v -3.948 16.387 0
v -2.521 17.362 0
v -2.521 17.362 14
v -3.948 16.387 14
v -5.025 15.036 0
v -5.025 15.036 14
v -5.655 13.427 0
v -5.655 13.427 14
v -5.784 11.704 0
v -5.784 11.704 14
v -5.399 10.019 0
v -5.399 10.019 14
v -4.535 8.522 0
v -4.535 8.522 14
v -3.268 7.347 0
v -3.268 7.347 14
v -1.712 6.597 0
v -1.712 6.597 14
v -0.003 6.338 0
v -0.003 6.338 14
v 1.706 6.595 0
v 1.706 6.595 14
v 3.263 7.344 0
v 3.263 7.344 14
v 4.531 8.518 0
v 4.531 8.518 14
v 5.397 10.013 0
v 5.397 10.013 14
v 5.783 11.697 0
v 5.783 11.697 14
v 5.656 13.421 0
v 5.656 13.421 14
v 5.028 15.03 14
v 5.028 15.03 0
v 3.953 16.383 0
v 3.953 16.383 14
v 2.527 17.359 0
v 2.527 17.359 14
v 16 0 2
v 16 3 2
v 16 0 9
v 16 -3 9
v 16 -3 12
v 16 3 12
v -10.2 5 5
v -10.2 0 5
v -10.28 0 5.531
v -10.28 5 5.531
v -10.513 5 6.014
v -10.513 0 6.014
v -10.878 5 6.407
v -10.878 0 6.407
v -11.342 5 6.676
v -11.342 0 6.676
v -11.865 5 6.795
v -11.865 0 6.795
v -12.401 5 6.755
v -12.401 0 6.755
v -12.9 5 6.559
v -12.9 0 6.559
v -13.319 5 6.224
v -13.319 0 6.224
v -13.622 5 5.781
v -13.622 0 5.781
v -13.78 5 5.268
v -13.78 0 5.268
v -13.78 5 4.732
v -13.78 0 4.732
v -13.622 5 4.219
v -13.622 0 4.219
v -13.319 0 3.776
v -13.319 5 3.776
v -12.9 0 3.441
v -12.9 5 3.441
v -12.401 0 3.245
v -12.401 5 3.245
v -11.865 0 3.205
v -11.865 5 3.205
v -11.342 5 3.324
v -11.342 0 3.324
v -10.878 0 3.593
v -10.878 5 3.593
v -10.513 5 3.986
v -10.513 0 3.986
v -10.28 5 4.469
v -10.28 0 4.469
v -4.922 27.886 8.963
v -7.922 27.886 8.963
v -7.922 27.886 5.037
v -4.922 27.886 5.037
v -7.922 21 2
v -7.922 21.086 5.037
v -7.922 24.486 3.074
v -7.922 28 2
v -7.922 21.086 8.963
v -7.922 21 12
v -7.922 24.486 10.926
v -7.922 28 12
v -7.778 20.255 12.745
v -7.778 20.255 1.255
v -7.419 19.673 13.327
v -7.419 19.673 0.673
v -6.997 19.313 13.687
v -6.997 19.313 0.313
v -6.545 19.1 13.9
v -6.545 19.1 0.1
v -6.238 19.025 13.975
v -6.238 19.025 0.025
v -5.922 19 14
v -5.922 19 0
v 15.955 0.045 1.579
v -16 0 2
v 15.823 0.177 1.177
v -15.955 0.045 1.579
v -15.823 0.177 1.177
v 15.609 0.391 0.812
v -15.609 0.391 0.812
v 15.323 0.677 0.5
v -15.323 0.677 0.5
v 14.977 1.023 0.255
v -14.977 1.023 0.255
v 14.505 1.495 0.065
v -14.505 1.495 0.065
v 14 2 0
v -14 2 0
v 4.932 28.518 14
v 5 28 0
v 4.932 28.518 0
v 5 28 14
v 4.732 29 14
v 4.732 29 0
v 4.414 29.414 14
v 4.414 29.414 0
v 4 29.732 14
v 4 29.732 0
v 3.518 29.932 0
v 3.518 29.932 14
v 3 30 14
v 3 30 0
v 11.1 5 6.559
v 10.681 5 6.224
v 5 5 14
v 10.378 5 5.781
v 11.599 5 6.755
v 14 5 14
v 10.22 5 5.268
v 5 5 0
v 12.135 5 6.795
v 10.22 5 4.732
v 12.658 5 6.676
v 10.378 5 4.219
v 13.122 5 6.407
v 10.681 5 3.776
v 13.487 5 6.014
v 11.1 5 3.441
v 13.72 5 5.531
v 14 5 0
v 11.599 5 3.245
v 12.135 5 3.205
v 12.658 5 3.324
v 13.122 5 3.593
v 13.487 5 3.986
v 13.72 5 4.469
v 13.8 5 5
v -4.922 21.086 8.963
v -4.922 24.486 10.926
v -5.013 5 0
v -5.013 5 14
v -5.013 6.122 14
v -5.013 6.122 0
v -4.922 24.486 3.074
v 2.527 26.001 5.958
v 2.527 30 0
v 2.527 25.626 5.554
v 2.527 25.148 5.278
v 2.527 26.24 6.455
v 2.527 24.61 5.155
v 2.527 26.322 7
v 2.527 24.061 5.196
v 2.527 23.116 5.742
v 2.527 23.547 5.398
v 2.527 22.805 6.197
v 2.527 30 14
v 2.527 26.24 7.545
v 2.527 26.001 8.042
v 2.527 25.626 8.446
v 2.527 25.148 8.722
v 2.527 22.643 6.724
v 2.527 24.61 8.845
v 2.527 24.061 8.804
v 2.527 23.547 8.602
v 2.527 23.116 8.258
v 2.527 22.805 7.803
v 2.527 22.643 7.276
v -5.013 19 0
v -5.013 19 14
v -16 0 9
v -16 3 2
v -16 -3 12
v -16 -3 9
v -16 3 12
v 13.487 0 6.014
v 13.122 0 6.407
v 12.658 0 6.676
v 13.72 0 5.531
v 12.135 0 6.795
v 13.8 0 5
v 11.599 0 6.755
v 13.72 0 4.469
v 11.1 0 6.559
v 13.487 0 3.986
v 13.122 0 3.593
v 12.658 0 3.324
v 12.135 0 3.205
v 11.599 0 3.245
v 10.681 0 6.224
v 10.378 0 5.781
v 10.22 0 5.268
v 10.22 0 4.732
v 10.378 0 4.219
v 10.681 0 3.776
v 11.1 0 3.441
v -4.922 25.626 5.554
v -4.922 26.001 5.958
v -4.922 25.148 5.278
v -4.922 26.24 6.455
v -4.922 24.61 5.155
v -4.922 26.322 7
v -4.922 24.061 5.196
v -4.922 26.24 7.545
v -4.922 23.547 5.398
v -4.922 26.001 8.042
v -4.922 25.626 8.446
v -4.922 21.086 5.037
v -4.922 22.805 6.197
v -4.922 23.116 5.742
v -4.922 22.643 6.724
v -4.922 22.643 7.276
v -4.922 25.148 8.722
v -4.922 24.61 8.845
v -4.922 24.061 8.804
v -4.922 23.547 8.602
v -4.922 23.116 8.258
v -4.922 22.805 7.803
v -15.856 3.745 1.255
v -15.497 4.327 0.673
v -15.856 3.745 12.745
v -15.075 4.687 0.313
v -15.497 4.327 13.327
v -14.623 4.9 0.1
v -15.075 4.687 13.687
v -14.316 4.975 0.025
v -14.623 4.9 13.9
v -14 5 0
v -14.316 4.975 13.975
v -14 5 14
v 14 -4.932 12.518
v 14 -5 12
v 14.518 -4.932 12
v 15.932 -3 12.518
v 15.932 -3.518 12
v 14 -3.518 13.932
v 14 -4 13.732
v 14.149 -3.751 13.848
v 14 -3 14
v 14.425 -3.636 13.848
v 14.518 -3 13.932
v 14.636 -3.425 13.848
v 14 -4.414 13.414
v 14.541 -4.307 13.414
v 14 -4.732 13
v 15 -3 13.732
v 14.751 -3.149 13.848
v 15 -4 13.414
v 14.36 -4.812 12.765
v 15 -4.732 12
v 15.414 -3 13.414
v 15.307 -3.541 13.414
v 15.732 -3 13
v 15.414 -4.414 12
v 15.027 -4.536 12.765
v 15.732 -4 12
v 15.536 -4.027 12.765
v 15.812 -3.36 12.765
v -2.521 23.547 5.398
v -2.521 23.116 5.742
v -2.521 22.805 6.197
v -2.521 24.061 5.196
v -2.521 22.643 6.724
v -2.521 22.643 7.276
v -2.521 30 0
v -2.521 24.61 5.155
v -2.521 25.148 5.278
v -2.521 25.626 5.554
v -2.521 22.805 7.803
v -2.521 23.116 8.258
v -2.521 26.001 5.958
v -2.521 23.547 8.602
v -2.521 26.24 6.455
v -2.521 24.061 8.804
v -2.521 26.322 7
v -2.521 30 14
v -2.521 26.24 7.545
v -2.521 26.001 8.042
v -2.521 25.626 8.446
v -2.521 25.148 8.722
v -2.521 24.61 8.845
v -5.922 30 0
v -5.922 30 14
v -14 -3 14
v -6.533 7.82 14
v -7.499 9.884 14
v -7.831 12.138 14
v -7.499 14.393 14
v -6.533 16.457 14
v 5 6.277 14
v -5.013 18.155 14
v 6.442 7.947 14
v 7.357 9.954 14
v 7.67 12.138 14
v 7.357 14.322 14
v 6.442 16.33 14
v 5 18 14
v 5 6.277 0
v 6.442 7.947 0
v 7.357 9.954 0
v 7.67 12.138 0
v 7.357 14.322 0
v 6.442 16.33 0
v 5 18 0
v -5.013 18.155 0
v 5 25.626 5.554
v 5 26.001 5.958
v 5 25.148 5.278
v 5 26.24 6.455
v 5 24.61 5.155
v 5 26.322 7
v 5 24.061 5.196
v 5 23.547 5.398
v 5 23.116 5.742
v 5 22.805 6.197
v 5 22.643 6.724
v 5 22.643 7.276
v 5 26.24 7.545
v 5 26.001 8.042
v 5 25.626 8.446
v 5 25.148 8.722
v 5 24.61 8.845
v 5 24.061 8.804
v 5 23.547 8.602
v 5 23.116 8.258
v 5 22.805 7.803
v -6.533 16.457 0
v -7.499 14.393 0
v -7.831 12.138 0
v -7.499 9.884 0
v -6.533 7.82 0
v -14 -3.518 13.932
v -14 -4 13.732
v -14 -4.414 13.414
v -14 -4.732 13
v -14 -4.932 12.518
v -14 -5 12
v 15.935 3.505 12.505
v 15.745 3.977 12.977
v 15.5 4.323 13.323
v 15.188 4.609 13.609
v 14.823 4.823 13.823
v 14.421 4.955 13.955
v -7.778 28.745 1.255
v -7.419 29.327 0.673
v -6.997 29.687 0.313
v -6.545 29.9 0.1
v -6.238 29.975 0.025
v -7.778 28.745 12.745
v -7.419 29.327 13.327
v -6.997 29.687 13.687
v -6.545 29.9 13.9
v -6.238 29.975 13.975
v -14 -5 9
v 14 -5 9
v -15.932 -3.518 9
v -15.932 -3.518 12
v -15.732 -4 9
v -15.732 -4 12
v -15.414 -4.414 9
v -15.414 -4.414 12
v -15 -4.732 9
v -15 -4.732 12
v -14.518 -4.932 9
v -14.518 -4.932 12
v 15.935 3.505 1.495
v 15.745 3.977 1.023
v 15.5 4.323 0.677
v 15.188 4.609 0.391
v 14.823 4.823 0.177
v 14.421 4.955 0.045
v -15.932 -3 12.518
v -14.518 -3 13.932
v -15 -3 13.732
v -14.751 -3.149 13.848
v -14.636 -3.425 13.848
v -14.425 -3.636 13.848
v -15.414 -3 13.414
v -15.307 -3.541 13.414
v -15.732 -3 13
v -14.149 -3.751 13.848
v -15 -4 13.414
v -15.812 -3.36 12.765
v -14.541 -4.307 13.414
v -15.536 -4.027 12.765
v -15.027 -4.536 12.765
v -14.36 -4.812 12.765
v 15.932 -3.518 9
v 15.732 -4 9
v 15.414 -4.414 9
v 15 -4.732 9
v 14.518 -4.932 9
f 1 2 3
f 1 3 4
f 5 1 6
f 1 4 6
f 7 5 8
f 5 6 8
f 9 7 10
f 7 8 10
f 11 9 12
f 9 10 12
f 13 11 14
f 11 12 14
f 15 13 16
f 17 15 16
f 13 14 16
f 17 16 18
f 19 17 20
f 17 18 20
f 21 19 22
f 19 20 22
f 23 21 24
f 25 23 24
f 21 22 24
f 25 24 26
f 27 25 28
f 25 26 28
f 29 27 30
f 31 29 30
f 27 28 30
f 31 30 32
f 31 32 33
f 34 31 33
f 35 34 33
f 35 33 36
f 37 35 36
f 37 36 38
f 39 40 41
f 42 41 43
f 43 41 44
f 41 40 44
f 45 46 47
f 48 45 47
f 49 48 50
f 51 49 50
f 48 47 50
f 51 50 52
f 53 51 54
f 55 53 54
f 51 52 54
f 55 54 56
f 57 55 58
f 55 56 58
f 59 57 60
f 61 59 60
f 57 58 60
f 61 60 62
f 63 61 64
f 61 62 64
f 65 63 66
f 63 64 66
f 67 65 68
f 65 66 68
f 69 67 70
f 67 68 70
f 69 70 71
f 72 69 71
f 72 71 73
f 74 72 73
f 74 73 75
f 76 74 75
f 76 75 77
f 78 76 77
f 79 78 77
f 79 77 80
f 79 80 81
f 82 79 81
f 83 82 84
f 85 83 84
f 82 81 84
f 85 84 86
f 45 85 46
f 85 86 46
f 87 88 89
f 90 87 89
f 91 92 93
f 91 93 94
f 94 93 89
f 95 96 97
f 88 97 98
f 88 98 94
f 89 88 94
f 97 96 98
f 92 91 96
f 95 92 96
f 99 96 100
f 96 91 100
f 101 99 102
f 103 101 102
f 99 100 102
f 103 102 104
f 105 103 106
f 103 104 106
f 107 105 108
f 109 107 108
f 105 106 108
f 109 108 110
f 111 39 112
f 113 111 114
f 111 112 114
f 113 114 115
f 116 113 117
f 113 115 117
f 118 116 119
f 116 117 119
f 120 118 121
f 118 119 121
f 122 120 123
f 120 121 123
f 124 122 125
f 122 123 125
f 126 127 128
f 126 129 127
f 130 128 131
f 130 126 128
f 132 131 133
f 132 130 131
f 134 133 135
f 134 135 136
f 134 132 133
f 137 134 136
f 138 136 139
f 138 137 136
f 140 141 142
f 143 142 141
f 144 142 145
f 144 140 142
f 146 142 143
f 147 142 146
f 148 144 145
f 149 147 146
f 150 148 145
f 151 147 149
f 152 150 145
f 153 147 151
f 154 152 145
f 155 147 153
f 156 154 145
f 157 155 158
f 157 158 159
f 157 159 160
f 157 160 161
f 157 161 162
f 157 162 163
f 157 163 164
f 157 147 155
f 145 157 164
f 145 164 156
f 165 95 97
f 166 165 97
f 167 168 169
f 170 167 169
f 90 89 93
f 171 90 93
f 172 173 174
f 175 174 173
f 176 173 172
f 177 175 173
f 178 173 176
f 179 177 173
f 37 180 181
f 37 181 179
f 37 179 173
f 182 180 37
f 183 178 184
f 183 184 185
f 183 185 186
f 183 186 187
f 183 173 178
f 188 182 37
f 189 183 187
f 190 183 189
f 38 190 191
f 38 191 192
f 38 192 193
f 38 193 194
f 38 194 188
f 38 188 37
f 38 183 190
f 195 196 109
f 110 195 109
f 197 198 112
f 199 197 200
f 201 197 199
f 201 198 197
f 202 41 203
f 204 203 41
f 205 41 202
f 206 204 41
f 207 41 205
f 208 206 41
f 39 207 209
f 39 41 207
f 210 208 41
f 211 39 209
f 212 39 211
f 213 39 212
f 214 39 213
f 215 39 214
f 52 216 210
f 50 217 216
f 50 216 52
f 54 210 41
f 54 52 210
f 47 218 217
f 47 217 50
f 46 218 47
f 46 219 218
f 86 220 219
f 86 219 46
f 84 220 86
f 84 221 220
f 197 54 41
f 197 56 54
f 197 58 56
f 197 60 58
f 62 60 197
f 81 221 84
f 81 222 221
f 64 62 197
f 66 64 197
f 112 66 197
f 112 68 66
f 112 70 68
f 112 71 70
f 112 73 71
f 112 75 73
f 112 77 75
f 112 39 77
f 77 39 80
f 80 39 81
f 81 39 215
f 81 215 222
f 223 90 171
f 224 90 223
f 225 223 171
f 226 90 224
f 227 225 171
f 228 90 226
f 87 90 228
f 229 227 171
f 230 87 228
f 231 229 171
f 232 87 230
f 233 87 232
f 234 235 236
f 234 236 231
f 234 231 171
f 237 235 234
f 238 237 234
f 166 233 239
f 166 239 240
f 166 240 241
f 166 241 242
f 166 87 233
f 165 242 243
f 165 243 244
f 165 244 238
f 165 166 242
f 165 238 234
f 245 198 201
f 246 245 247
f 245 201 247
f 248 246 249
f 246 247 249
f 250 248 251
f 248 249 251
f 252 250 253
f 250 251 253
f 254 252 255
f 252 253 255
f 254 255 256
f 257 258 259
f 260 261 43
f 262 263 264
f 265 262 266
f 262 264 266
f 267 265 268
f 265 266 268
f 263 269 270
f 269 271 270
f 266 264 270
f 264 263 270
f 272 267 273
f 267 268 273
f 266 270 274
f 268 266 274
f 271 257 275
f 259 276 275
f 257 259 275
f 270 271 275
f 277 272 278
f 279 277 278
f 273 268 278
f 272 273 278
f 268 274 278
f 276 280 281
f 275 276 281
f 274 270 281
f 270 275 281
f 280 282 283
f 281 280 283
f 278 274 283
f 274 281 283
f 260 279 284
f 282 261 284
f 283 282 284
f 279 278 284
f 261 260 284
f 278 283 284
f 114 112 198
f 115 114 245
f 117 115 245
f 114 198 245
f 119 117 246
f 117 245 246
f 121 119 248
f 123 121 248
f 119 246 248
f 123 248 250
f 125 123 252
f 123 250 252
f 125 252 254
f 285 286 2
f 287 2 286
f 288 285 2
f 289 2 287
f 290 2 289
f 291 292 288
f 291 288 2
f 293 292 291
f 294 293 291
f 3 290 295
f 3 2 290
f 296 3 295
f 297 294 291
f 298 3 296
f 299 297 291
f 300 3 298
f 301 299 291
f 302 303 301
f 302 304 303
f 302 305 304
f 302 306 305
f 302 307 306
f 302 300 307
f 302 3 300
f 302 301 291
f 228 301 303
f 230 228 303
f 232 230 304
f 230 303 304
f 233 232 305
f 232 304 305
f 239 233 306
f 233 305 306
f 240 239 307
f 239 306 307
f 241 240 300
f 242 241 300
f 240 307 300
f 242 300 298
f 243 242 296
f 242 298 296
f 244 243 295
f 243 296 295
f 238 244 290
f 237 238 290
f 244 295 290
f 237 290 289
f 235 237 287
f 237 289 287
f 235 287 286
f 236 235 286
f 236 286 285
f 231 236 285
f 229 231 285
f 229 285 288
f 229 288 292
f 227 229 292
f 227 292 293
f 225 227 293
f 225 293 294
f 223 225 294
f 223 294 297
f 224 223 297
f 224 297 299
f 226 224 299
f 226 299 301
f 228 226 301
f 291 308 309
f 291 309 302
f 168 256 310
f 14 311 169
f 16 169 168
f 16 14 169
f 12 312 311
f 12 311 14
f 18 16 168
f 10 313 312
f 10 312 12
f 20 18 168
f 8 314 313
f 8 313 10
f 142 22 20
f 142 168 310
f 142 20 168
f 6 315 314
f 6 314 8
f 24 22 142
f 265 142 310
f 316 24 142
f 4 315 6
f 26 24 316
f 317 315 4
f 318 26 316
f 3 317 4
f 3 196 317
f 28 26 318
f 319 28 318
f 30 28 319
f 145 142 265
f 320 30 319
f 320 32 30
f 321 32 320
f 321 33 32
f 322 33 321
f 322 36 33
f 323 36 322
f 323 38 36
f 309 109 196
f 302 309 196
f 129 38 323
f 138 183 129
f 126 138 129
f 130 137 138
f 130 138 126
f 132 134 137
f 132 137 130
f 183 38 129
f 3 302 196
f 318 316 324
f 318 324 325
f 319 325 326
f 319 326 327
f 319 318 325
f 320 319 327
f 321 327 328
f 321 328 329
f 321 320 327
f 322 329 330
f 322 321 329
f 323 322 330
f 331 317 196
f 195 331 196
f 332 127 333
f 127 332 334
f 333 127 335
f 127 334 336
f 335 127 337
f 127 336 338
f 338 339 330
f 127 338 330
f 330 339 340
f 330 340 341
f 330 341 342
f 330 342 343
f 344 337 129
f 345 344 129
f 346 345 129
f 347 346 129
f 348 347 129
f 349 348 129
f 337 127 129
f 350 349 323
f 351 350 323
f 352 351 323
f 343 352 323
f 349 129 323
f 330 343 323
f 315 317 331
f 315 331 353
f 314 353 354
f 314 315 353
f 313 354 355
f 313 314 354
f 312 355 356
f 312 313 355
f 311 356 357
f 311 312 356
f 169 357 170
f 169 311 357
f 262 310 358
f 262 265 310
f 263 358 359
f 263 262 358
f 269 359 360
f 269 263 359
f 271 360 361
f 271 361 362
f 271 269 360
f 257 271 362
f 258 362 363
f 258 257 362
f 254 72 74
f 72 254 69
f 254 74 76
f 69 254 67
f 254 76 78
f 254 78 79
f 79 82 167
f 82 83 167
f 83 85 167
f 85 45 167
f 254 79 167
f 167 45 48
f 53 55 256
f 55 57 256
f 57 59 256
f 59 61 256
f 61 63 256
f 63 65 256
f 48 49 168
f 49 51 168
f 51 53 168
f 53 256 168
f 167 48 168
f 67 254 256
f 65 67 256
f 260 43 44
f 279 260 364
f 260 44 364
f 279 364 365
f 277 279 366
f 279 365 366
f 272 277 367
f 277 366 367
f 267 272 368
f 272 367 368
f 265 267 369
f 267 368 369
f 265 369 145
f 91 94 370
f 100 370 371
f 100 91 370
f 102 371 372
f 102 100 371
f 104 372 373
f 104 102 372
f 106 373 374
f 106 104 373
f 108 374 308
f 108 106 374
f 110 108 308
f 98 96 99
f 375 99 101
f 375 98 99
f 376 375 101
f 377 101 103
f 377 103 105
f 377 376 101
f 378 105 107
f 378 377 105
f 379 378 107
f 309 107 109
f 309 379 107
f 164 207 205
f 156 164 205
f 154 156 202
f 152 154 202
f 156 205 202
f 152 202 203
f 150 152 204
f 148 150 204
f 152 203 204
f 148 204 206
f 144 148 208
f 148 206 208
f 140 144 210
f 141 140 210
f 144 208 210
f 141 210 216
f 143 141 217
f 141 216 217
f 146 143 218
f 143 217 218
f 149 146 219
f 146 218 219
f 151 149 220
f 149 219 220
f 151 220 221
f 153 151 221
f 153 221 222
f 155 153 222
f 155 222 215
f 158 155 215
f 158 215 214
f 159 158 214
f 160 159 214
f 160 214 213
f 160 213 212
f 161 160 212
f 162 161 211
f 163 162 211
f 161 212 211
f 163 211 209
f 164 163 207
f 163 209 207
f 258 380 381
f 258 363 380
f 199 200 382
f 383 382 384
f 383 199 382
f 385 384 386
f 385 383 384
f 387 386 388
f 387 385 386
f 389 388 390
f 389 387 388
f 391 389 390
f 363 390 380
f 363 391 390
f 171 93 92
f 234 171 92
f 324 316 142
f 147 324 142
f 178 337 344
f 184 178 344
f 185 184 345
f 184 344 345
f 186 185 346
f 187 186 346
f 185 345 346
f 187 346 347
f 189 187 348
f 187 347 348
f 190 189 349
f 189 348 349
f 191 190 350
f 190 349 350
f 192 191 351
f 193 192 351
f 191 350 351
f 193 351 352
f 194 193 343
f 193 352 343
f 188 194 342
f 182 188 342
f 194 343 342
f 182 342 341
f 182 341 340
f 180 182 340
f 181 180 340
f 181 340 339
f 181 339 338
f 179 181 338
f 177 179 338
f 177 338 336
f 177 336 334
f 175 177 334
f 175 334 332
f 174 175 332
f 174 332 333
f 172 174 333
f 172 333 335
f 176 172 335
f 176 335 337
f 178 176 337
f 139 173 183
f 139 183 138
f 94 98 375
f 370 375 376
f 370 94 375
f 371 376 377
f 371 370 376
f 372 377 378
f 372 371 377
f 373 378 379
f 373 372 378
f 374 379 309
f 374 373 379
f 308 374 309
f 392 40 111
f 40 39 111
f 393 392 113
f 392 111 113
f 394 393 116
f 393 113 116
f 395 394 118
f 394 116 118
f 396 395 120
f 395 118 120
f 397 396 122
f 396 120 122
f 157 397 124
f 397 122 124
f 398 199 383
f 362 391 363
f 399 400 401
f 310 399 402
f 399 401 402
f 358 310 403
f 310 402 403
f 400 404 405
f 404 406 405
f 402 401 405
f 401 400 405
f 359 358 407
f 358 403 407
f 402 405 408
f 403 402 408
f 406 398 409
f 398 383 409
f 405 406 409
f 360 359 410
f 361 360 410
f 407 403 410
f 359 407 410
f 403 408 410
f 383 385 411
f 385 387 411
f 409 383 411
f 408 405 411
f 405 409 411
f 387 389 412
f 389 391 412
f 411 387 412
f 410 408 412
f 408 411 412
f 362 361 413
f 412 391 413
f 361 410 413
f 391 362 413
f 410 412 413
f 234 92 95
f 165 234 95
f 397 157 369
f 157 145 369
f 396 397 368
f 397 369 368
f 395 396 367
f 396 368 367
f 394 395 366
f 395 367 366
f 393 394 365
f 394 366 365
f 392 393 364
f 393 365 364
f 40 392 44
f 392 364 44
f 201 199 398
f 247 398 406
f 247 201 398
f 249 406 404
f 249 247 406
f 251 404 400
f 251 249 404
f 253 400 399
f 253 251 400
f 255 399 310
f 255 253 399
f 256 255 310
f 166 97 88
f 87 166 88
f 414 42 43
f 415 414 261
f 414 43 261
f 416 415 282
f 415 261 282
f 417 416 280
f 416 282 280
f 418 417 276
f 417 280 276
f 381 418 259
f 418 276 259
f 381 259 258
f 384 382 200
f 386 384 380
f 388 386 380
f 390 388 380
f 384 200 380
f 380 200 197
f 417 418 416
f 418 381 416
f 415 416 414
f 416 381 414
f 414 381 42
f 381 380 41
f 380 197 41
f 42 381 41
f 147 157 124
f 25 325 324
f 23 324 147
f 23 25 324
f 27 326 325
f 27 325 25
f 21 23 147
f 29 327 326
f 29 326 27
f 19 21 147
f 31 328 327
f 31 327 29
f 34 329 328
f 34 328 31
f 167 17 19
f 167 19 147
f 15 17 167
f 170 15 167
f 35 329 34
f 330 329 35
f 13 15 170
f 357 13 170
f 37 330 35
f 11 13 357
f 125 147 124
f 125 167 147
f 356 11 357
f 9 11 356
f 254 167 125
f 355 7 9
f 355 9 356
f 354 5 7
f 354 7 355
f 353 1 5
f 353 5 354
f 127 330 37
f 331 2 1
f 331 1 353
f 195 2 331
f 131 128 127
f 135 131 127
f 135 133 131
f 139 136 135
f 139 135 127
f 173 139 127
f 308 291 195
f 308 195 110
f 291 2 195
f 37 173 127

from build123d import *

# Parameters (mm, degrees)
PAD_DEPTH       = 14
POCKET_DEPTH    = 14.001
POCKET001_DEPTH = 3
SKETCH007_R     = 1.85
POCKET002_DEPTH = 21.001
SKETCH008_R     = 1.8
POCKET003_DEPTH = 5
SKETCH009_W     = 32
SKETCH009_H     = 5
PAD001_DEPTH    = 5
FILLET_R        = 2


with BuildPart() as part:
    # Sketch → Pad (new body)
    with BuildSketch(Plane.XY):
        Polygon((-8, 30), (8, 30), (8, 5), (16, 5), (16, 0), (-16, 0), (-16, 5), (-8, 5), align=None)
    extrude(amount=PAD_DEPTH)

    # Sketch002 → Pocket (cut, through all)
    with BuildSketch(Plane.XY.offset(14)):
        with BuildLine():
            ThreePointArc((-5.012819, 18.154908), (-7.83109, 12.138463), (-5.012819, 6.122018))
            Line((-5.012819, 5), (-5.012819, 6.122018))
            Line((-8.968158, 5), (-5.012819, 5))
            Line((-8.890375, 30.926365), (-8.968158, 5))
            Line((-7.922217, 30.944389), (-8.890375, 30.926365))
            Line((-7.922217, 19), (-7.922217, 30.944389))
            Line((-5.012819, 19), (-7.922217, 19))
            Line((-5.012819, 18.154908), (-5.012819, 19))
        make_face()
        with BuildLine():
            Line((5, 31), (5, 18))
            ThreePointArc((5, 6.276926), (7.670247, 12.138463), (5, 18))
            Line((5, 6.276926), (5, 5))
            Line((10, 5), (5, 5))
            Line((10, 31), (10, 5))
            Line((5, 31), (10, 31))
        make_face()
        with BuildLine():
            ThreePointArc((-2.521136, 17.36186), (-0.003033, 6.338464), (2.526597, 17.35922))
            Line((2.526597, 31), (2.526597, 17.35922))
            Line((-2.521136, 31), (2.526597, 31))
            Line((-2.521136, 17.36186), (-2.521136, 31))
        make_face()
    extrude(amount=-POCKET_DEPTH, mode=Mode.SUBTRACT)

    # Sketch006 → Pocket001 (cut)
    with BuildSketch(Plane(origin=(-7.922217, 0, 0), x_dir=(0, -1, 0), z_dir=(-1, 0, 0))):
        Polygon((-21.086217, 5.037009), (-21.086217, 8.962991), (-24.486217, 10.925982), (-27.886217, 8.962991), (-27.886217, 5.037009), (-24.486217, 3.074018), align=None)
    extrude(amount=-POCKET001_DEPTH, mode=Mode.SUBTRACT)

    # Sketch007 → Pocket002 (cut, through all)
    with BuildSketch(Plane.YZ.offset(5)):
        with Locations((24.472246, 7)):
            Circle(SKETCH007_R)
    extrude(amount=-POCKET002_DEPTH, mode=Mode.SUBTRACT)

    # Sketch008 → Pocket003 (cut)
    with BuildSketch(Plane.XZ):
        with Locations((-12, 5)):
            Circle(SKETCH008_R)
        with Locations((12, 5)):
            Circle(SKETCH008_R)
    extrude(amount=-POCKET003_DEPTH, mode=Mode.SUBTRACT)

    # Sketch009 → Pad001 (new body)
    with BuildSketch(Plane.XZ):
        with Locations((0, 11.5)):
            Rectangle(SKETCH009_W, SKETCH009_H)
    extrude(amount=PAD001_DEPTH)

    # Fillet
    fillet_edges = [part.edges().sort_by_distance(p)[0] for p in [
        (-16, -5, 11.5),
        (16, -5, 11.5),
        (16, 5, 7),
        (5, 30, 7),
        (-16, 5, 7),
        (-7.922217, 30, 7),
        (0, 0, 0),
        (-16, 0, 14),
        (0, -5, 14),
        (16, 0, 14),
        (16, 2.5, 0),
        (-16, 2.5, 0),
        (-7.922217, 24.5, 0),
        (-7.922217, 24.5, 14),
        (-7.922217, 19, 7),
    ]]
    fillet(fillet_edges, radius=FILLET_R)


solid = part.part
